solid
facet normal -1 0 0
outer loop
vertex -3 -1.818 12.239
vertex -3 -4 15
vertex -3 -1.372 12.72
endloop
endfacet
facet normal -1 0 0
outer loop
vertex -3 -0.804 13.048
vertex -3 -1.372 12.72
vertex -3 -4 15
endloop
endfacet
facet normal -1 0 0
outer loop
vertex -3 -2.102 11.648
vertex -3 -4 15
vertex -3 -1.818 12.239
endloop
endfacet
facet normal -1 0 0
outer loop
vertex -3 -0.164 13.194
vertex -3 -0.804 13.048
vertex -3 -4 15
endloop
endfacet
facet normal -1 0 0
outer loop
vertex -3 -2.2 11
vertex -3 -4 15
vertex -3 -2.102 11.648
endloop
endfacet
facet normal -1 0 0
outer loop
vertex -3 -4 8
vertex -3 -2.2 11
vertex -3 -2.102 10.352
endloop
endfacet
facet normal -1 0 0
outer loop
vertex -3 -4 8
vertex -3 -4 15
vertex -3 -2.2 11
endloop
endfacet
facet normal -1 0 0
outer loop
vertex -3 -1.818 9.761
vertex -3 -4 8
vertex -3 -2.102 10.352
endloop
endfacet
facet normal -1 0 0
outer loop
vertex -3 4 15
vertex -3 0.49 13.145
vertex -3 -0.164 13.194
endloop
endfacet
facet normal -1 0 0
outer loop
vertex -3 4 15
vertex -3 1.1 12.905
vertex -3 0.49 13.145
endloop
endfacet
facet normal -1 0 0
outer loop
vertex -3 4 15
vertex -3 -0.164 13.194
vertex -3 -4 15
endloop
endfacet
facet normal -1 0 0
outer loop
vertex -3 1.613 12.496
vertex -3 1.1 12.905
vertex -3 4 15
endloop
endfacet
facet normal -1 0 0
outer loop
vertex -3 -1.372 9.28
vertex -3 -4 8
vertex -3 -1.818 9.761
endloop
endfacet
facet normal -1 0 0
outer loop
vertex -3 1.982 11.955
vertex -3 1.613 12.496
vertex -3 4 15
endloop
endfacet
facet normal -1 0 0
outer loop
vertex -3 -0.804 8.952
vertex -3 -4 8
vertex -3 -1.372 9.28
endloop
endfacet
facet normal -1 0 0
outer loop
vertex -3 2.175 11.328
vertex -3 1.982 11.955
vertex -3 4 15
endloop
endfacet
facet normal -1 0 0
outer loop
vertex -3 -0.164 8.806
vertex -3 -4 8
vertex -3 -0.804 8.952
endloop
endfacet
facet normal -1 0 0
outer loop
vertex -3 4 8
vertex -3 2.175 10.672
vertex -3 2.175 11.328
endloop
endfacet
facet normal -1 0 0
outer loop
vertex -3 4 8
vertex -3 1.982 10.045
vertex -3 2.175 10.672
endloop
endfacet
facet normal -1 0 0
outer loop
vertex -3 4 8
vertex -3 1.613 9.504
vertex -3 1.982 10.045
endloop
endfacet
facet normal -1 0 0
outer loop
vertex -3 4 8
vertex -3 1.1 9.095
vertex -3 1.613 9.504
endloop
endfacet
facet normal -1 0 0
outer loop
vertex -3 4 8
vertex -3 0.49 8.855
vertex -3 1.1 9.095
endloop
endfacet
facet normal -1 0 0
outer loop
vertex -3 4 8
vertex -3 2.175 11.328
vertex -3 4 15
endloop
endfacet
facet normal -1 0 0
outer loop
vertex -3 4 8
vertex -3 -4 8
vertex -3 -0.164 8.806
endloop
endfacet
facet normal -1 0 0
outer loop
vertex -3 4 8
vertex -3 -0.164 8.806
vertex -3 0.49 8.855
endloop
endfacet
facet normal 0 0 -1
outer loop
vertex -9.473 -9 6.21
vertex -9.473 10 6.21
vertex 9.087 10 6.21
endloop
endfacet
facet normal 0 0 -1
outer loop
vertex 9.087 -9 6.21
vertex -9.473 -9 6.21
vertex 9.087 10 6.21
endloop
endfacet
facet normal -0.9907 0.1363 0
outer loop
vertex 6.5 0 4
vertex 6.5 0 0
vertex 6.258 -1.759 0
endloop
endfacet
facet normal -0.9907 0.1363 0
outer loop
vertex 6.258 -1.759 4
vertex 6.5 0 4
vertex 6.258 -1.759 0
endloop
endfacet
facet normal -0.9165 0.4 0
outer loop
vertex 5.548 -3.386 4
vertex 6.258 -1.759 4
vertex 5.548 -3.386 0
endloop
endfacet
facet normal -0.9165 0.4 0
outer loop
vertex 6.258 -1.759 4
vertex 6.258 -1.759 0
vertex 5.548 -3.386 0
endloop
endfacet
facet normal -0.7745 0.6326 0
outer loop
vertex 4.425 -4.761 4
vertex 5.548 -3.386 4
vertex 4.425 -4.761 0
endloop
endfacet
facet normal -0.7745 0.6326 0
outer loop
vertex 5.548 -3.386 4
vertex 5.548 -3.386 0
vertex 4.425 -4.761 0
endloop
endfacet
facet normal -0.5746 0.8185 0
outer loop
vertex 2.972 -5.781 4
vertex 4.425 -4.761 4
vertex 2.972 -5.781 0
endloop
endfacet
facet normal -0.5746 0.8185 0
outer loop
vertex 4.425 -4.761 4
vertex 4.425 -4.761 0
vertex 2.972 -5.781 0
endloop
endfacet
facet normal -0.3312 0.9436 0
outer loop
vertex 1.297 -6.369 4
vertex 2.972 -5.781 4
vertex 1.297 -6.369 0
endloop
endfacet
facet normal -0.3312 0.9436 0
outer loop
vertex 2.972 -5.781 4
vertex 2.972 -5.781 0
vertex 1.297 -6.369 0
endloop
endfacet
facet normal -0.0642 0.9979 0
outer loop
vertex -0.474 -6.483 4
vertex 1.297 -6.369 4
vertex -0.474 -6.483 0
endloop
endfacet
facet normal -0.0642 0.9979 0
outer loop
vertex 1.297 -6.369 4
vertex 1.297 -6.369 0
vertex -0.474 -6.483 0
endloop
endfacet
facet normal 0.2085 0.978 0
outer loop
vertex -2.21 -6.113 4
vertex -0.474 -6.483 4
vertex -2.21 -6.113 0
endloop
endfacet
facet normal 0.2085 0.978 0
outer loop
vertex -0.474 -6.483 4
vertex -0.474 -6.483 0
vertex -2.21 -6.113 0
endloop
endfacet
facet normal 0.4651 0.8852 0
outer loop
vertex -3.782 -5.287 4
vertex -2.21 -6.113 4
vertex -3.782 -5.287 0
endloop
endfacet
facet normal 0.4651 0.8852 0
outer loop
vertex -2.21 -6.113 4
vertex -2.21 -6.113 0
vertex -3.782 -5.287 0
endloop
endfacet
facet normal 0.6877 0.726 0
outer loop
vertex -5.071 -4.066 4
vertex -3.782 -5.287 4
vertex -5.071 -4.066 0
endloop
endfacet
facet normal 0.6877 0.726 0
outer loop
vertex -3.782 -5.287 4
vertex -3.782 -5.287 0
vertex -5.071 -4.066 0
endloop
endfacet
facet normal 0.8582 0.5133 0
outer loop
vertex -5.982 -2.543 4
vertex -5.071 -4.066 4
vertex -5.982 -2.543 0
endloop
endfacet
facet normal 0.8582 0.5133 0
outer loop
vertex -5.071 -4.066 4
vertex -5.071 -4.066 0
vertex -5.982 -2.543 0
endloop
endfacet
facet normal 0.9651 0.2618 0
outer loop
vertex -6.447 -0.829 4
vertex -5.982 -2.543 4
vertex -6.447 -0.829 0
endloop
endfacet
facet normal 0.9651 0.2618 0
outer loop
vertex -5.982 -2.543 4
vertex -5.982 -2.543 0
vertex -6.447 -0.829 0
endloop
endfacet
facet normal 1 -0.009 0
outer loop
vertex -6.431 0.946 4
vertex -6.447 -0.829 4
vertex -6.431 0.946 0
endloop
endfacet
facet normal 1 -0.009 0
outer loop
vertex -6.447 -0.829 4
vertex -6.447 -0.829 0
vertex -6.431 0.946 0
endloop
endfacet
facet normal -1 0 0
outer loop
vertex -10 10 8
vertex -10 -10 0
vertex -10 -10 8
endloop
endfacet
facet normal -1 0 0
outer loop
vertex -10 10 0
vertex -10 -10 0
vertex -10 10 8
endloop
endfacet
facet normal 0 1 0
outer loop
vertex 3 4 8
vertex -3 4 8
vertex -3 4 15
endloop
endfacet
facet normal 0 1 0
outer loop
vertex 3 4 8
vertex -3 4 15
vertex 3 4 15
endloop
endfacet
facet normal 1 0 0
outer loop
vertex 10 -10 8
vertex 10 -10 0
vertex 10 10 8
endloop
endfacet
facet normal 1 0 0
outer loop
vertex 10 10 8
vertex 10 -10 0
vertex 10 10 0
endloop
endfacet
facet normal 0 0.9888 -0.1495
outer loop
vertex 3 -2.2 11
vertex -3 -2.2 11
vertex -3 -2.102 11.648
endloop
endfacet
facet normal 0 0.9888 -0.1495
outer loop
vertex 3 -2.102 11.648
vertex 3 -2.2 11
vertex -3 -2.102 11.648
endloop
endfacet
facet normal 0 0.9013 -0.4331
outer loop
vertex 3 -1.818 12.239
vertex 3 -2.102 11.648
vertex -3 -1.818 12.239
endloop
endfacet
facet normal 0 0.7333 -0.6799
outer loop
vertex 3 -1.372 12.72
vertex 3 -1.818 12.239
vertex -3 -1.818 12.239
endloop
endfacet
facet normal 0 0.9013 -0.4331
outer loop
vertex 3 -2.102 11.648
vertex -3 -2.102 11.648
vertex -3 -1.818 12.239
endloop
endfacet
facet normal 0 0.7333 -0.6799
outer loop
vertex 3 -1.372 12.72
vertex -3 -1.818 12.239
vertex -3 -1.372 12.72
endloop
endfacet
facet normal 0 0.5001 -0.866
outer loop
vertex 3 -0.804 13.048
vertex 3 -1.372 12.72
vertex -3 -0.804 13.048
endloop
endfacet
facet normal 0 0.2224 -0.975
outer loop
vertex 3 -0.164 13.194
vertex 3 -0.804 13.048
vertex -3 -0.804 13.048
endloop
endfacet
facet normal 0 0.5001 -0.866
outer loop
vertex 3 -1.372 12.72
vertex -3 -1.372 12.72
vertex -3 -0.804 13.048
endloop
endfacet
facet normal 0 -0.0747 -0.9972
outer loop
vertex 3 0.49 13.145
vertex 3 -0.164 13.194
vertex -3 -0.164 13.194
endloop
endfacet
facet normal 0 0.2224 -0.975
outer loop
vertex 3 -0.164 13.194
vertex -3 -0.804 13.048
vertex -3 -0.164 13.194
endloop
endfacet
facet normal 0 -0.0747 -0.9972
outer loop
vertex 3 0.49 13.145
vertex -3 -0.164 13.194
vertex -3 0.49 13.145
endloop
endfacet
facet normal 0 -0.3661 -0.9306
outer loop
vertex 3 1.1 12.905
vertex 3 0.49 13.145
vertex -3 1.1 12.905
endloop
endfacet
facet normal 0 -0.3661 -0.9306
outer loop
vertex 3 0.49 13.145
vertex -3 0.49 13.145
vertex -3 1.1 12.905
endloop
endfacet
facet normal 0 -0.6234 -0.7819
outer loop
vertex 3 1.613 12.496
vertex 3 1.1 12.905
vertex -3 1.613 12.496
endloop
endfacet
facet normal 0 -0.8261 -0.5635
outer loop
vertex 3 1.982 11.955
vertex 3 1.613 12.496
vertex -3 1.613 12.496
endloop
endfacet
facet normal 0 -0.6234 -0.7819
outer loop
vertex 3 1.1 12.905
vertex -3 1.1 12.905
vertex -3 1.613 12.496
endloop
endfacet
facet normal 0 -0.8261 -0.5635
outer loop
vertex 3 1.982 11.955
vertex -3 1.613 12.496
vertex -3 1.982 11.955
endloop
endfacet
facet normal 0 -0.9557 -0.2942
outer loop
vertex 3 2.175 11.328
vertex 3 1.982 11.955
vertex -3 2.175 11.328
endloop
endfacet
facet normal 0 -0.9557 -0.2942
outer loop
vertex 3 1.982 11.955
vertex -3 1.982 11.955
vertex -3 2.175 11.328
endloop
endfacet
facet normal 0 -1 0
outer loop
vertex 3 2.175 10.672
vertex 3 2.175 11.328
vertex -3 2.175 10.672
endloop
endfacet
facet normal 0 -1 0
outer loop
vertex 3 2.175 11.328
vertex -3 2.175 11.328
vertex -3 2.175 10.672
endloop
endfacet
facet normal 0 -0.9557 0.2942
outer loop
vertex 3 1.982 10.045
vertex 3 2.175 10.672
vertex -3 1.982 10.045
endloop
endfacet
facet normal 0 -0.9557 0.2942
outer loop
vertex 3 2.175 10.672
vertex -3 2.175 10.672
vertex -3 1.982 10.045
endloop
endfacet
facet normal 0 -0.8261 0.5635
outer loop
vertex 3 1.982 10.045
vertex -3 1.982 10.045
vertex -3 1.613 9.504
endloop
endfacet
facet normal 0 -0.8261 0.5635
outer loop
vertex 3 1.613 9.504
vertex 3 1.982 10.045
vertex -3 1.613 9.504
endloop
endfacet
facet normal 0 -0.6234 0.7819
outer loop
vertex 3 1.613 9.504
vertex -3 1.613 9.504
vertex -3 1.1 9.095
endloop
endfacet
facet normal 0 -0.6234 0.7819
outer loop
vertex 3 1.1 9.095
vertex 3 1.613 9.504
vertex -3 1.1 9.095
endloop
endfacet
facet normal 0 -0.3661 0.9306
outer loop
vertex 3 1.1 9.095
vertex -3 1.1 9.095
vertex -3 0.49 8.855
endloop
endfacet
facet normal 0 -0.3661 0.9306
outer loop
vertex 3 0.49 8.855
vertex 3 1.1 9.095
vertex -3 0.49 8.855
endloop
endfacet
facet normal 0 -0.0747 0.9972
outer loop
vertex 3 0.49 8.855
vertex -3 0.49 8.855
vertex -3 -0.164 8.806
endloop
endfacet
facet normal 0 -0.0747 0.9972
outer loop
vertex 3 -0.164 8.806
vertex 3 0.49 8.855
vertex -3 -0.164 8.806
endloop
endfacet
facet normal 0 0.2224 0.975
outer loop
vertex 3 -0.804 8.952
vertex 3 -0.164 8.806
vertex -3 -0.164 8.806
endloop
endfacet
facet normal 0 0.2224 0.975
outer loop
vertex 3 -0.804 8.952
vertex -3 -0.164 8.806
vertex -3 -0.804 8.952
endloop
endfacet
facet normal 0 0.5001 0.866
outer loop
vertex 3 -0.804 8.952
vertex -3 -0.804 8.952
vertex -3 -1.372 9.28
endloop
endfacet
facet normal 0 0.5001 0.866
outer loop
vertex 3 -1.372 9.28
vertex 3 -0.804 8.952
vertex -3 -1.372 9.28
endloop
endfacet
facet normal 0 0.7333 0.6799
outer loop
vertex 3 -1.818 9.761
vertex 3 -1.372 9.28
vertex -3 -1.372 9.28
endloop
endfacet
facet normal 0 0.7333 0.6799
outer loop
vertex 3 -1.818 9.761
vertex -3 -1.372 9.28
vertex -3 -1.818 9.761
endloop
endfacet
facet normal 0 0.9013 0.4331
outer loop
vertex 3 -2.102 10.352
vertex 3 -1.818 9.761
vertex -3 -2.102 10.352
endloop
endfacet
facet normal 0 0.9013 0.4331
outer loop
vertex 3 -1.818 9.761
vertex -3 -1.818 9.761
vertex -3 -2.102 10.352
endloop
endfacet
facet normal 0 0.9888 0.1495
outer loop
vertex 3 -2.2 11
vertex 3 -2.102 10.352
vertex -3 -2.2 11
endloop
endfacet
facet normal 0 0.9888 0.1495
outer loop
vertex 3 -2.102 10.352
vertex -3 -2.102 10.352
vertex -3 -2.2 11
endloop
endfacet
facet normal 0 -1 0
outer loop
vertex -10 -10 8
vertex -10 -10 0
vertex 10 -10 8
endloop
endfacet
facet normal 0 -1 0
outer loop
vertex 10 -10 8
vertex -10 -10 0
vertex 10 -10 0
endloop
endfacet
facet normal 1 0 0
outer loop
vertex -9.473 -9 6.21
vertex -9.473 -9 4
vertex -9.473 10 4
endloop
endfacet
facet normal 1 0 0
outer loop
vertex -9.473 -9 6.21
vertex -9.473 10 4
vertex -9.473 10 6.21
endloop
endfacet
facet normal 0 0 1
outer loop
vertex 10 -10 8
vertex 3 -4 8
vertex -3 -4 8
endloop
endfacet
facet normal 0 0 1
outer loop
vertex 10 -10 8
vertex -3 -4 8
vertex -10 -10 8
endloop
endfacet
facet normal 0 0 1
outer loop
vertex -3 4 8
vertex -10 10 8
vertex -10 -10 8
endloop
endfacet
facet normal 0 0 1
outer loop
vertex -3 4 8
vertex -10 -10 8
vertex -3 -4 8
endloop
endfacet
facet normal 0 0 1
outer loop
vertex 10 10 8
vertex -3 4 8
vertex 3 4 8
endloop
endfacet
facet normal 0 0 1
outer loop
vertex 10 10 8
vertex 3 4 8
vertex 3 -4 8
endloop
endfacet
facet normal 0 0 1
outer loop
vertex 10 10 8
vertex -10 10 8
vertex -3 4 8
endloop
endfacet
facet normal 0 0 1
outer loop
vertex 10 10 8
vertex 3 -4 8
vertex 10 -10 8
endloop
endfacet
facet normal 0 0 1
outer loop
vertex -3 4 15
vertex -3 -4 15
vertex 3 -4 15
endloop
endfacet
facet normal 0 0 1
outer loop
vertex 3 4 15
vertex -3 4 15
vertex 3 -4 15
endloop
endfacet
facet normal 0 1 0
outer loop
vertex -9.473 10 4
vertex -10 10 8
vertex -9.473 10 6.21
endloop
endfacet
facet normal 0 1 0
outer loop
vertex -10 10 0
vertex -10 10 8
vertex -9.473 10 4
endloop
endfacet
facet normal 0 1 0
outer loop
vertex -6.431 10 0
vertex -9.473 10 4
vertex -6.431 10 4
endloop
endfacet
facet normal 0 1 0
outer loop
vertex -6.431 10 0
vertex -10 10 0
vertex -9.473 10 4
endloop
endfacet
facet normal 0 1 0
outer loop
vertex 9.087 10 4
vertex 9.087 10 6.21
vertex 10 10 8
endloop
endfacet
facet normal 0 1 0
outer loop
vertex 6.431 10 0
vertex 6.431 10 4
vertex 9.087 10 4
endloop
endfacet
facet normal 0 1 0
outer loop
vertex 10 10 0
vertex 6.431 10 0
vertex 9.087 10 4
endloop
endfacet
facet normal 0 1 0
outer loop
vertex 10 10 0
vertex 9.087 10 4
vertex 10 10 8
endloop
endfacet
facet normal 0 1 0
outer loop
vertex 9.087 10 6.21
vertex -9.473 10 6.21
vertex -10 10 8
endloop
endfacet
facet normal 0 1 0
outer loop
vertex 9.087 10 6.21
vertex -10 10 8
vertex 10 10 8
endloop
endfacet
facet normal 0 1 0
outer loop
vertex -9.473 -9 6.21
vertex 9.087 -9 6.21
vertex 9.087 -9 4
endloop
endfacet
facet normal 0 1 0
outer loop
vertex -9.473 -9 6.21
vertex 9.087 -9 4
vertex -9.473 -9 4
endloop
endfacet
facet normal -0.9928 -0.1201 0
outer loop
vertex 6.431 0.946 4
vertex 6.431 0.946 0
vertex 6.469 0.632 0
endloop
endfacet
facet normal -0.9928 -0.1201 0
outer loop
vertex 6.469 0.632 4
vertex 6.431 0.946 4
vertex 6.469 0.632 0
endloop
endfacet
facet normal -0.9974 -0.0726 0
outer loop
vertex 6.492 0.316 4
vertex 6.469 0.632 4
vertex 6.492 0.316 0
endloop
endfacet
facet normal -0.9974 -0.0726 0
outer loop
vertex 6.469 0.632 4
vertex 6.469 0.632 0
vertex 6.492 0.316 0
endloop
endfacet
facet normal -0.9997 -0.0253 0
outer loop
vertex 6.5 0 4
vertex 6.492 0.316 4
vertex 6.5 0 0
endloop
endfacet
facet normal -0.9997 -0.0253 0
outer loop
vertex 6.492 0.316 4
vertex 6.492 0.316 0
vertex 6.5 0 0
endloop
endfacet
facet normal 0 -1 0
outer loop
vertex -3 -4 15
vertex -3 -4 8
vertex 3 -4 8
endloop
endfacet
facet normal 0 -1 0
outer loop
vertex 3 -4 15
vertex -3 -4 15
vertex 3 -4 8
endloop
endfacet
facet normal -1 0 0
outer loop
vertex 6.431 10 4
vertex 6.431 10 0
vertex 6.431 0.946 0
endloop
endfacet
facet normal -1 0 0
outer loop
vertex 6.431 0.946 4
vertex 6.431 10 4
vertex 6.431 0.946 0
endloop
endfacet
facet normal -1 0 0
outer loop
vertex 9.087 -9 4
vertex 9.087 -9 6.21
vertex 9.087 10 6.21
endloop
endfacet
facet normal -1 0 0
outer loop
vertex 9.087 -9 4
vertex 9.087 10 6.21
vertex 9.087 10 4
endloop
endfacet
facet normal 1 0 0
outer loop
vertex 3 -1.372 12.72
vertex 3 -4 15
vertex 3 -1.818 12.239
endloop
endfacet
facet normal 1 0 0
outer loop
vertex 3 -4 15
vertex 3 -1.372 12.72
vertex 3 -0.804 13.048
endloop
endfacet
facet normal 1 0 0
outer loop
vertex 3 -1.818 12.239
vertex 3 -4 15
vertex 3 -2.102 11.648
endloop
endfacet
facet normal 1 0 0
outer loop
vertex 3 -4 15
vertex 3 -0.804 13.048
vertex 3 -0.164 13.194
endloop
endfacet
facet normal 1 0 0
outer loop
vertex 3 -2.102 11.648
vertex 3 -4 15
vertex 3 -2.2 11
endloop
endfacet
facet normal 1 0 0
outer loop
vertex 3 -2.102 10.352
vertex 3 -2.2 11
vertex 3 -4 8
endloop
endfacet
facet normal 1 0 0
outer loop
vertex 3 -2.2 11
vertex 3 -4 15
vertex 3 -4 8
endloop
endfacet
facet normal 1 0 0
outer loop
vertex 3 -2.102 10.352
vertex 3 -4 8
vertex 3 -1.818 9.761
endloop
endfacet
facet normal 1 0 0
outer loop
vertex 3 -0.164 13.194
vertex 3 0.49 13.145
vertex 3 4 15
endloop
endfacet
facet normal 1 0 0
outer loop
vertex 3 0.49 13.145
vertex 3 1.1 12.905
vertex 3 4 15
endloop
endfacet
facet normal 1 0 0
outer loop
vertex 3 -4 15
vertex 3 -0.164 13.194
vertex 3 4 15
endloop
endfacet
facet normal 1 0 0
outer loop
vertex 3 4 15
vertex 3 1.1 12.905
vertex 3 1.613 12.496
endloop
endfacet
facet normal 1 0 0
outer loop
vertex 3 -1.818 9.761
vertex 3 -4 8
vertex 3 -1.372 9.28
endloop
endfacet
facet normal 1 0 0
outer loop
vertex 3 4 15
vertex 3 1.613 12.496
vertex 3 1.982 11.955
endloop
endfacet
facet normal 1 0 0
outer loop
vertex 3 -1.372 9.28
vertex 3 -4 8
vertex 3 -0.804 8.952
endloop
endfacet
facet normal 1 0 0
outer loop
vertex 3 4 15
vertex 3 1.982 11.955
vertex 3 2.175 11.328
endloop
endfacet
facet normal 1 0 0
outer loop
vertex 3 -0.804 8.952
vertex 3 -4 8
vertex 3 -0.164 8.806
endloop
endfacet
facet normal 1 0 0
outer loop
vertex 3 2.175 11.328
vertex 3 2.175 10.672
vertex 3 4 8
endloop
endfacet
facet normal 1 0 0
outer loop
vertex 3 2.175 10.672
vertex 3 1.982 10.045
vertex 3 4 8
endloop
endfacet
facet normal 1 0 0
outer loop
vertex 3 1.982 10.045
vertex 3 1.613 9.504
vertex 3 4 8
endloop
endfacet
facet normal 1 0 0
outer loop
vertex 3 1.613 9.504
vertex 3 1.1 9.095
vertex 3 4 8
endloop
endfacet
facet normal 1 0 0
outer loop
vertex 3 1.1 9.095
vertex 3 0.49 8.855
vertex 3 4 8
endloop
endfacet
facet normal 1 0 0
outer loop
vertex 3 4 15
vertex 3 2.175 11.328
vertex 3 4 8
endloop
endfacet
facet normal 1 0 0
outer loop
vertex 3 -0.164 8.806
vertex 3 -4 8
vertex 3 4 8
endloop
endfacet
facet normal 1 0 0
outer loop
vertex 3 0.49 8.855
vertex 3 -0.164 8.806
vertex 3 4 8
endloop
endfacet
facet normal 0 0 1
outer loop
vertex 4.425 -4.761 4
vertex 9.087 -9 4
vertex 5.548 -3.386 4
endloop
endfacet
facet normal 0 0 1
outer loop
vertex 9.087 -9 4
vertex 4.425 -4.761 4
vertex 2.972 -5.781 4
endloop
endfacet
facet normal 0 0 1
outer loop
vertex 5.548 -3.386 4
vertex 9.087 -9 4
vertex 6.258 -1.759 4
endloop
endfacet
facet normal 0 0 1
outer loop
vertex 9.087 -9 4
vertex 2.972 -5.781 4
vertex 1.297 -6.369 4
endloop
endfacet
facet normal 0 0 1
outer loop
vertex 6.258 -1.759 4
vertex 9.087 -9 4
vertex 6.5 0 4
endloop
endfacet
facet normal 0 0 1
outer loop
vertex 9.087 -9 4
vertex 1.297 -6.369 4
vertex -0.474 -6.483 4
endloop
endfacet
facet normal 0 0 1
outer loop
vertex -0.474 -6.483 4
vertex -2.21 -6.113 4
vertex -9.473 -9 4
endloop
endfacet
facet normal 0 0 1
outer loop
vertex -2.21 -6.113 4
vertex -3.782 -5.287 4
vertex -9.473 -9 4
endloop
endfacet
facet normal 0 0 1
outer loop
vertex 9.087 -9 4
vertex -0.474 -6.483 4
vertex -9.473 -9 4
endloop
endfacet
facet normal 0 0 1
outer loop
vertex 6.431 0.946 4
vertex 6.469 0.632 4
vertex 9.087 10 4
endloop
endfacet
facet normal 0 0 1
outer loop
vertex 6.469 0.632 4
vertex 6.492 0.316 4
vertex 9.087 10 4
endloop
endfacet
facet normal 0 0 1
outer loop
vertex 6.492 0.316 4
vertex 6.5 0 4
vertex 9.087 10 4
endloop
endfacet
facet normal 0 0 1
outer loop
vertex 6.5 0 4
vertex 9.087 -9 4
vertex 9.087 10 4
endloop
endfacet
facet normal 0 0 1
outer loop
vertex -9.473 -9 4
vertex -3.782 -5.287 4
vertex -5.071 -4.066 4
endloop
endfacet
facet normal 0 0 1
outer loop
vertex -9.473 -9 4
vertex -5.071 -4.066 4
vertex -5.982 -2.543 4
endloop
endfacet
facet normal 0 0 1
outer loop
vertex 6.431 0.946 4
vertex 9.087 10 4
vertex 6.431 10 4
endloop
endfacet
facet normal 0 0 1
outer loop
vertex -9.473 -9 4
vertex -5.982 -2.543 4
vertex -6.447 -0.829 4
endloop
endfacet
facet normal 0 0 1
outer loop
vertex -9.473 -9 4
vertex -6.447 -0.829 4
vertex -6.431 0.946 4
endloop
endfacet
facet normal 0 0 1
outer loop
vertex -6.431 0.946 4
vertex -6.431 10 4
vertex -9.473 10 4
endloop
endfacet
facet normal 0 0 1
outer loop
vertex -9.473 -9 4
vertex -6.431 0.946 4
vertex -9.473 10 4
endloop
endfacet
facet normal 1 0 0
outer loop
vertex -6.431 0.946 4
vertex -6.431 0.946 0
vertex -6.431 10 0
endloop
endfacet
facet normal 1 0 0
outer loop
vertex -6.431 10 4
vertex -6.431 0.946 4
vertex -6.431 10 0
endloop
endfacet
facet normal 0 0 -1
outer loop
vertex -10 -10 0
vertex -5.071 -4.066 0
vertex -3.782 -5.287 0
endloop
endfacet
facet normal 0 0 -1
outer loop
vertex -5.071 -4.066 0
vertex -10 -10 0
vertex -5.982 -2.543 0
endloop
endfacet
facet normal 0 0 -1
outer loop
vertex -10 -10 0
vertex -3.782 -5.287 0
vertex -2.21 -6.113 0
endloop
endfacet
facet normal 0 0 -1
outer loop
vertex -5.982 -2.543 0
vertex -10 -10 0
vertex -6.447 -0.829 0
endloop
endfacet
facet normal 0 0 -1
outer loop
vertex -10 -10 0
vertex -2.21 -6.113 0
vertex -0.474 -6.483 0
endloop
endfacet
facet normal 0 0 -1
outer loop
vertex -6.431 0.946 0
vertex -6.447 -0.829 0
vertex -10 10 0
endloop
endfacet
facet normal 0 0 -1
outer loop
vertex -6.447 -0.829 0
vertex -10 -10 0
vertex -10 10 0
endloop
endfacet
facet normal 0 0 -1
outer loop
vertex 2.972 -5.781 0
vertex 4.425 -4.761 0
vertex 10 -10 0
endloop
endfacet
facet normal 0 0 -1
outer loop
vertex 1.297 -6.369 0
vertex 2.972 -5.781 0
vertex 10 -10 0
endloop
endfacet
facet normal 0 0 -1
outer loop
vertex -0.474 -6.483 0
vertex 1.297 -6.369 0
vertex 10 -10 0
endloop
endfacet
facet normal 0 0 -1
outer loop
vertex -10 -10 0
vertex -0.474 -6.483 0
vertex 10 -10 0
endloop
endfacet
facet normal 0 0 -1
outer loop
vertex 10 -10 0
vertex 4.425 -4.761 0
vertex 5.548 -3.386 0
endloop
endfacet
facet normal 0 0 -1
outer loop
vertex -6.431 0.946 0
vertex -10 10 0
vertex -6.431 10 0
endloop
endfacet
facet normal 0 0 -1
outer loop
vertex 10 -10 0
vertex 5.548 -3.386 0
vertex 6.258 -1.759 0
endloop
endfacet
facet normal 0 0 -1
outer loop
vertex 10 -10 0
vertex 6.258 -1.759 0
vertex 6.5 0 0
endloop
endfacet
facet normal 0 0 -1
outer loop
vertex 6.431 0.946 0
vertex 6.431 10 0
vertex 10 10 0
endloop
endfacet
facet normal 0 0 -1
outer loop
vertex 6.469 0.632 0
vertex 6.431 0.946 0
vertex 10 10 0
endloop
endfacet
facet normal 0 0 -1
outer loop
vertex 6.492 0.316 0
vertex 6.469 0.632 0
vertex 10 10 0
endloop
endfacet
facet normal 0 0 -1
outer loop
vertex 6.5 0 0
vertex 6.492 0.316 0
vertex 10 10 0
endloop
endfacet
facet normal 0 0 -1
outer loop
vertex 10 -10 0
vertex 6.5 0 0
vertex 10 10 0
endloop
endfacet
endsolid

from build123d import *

# Parameters (mm, degrees)
F0_W     = 20
F0_H     = 20
F1_DEPTH = 8
F3_DEPTH = 4
F5_DEPTH = 19
F6_W     = 6
F6_H     = 8
F7_DEPTH = 7
F8_R     = 2.2
F9_DEPTH = 6


with BuildPart() as f1:
    # F0 (on Top) → F1 (new body)
    with BuildSketch(Plane.XY):
        Rectangle(F0_W, F0_H)
    extrude(amount=F1_DEPTH)

    # F2 (on face) → F3 (cut)
    with BuildSketch(Plane(origin=(0, 0, 0), x_dir=(1, 0, 0), z_dir=(0, 0, -1))):
        with BuildLine():
            ThreePointArc((6.430839, -0.945677), (6.482687, -0.474101), (6.5, 0))
            ThreePointArc((6.5, 0), (-0.474101, 6.482687), (-6.430839, -0.945677))
            Line((-6.430839, -0.945677), (6.430839, -0.945677))
        make_face()
        with BuildLine():
            Line((6.430839, -0.945677), (-6.430839, -0.945677))
            ThreePointArc((-6.430839, -0.945677), (0, -6.5), (6.430839, -0.945677))
        make_face()
        with BuildLine():
            ThreePointArc((6.430839, -0.945677), (0, -6.5), (-6.430839, -0.945677))
            Line((-6.430839, -0.945677), (-6.430839, -10))
            Line((-6.430839, -10), (6.430839, -10))
            Line((6.430839, -10), (6.430839, -0.945677))
        make_face()
    extrude(amount=-F3_DEPTH, mode=Mode.SUBTRACT)

    # F4 (on face) → F5 (cut)
    with BuildSketch(Plane(origin=(0, 10, 0), x_dir=(-1, 0, 0), z_dir=(0, 1, 0))):
        Polygon((6.430839, 4), (9.473302, 4), (9.473302, 6.210144), (-9.087299, 6.210144), (-9.087299, 4), (-6.430839, 4), align=None)
    extrude(amount=-F5_DEPTH, mode=Mode.SUBTRACT)

    # F6 (on face) → F7 (join)
    with BuildSketch(Plane.XY.offset(8)):
        Rectangle(F6_W, F6_H)
    extrude(amount=F7_DEPTH)

    # F8 (on face) → F9 (cut)
    with BuildSketch(Plane(origin=(-3, 0, 0), x_dir=(0, -1, 0), z_dir=(-1, 0, 0))):
        with Locations((0, 11)):
            Circle(F8_R)
    extrude(amount=-F9_DEPTH, mode=Mode.SUBTRACT)


solid = f1.part
